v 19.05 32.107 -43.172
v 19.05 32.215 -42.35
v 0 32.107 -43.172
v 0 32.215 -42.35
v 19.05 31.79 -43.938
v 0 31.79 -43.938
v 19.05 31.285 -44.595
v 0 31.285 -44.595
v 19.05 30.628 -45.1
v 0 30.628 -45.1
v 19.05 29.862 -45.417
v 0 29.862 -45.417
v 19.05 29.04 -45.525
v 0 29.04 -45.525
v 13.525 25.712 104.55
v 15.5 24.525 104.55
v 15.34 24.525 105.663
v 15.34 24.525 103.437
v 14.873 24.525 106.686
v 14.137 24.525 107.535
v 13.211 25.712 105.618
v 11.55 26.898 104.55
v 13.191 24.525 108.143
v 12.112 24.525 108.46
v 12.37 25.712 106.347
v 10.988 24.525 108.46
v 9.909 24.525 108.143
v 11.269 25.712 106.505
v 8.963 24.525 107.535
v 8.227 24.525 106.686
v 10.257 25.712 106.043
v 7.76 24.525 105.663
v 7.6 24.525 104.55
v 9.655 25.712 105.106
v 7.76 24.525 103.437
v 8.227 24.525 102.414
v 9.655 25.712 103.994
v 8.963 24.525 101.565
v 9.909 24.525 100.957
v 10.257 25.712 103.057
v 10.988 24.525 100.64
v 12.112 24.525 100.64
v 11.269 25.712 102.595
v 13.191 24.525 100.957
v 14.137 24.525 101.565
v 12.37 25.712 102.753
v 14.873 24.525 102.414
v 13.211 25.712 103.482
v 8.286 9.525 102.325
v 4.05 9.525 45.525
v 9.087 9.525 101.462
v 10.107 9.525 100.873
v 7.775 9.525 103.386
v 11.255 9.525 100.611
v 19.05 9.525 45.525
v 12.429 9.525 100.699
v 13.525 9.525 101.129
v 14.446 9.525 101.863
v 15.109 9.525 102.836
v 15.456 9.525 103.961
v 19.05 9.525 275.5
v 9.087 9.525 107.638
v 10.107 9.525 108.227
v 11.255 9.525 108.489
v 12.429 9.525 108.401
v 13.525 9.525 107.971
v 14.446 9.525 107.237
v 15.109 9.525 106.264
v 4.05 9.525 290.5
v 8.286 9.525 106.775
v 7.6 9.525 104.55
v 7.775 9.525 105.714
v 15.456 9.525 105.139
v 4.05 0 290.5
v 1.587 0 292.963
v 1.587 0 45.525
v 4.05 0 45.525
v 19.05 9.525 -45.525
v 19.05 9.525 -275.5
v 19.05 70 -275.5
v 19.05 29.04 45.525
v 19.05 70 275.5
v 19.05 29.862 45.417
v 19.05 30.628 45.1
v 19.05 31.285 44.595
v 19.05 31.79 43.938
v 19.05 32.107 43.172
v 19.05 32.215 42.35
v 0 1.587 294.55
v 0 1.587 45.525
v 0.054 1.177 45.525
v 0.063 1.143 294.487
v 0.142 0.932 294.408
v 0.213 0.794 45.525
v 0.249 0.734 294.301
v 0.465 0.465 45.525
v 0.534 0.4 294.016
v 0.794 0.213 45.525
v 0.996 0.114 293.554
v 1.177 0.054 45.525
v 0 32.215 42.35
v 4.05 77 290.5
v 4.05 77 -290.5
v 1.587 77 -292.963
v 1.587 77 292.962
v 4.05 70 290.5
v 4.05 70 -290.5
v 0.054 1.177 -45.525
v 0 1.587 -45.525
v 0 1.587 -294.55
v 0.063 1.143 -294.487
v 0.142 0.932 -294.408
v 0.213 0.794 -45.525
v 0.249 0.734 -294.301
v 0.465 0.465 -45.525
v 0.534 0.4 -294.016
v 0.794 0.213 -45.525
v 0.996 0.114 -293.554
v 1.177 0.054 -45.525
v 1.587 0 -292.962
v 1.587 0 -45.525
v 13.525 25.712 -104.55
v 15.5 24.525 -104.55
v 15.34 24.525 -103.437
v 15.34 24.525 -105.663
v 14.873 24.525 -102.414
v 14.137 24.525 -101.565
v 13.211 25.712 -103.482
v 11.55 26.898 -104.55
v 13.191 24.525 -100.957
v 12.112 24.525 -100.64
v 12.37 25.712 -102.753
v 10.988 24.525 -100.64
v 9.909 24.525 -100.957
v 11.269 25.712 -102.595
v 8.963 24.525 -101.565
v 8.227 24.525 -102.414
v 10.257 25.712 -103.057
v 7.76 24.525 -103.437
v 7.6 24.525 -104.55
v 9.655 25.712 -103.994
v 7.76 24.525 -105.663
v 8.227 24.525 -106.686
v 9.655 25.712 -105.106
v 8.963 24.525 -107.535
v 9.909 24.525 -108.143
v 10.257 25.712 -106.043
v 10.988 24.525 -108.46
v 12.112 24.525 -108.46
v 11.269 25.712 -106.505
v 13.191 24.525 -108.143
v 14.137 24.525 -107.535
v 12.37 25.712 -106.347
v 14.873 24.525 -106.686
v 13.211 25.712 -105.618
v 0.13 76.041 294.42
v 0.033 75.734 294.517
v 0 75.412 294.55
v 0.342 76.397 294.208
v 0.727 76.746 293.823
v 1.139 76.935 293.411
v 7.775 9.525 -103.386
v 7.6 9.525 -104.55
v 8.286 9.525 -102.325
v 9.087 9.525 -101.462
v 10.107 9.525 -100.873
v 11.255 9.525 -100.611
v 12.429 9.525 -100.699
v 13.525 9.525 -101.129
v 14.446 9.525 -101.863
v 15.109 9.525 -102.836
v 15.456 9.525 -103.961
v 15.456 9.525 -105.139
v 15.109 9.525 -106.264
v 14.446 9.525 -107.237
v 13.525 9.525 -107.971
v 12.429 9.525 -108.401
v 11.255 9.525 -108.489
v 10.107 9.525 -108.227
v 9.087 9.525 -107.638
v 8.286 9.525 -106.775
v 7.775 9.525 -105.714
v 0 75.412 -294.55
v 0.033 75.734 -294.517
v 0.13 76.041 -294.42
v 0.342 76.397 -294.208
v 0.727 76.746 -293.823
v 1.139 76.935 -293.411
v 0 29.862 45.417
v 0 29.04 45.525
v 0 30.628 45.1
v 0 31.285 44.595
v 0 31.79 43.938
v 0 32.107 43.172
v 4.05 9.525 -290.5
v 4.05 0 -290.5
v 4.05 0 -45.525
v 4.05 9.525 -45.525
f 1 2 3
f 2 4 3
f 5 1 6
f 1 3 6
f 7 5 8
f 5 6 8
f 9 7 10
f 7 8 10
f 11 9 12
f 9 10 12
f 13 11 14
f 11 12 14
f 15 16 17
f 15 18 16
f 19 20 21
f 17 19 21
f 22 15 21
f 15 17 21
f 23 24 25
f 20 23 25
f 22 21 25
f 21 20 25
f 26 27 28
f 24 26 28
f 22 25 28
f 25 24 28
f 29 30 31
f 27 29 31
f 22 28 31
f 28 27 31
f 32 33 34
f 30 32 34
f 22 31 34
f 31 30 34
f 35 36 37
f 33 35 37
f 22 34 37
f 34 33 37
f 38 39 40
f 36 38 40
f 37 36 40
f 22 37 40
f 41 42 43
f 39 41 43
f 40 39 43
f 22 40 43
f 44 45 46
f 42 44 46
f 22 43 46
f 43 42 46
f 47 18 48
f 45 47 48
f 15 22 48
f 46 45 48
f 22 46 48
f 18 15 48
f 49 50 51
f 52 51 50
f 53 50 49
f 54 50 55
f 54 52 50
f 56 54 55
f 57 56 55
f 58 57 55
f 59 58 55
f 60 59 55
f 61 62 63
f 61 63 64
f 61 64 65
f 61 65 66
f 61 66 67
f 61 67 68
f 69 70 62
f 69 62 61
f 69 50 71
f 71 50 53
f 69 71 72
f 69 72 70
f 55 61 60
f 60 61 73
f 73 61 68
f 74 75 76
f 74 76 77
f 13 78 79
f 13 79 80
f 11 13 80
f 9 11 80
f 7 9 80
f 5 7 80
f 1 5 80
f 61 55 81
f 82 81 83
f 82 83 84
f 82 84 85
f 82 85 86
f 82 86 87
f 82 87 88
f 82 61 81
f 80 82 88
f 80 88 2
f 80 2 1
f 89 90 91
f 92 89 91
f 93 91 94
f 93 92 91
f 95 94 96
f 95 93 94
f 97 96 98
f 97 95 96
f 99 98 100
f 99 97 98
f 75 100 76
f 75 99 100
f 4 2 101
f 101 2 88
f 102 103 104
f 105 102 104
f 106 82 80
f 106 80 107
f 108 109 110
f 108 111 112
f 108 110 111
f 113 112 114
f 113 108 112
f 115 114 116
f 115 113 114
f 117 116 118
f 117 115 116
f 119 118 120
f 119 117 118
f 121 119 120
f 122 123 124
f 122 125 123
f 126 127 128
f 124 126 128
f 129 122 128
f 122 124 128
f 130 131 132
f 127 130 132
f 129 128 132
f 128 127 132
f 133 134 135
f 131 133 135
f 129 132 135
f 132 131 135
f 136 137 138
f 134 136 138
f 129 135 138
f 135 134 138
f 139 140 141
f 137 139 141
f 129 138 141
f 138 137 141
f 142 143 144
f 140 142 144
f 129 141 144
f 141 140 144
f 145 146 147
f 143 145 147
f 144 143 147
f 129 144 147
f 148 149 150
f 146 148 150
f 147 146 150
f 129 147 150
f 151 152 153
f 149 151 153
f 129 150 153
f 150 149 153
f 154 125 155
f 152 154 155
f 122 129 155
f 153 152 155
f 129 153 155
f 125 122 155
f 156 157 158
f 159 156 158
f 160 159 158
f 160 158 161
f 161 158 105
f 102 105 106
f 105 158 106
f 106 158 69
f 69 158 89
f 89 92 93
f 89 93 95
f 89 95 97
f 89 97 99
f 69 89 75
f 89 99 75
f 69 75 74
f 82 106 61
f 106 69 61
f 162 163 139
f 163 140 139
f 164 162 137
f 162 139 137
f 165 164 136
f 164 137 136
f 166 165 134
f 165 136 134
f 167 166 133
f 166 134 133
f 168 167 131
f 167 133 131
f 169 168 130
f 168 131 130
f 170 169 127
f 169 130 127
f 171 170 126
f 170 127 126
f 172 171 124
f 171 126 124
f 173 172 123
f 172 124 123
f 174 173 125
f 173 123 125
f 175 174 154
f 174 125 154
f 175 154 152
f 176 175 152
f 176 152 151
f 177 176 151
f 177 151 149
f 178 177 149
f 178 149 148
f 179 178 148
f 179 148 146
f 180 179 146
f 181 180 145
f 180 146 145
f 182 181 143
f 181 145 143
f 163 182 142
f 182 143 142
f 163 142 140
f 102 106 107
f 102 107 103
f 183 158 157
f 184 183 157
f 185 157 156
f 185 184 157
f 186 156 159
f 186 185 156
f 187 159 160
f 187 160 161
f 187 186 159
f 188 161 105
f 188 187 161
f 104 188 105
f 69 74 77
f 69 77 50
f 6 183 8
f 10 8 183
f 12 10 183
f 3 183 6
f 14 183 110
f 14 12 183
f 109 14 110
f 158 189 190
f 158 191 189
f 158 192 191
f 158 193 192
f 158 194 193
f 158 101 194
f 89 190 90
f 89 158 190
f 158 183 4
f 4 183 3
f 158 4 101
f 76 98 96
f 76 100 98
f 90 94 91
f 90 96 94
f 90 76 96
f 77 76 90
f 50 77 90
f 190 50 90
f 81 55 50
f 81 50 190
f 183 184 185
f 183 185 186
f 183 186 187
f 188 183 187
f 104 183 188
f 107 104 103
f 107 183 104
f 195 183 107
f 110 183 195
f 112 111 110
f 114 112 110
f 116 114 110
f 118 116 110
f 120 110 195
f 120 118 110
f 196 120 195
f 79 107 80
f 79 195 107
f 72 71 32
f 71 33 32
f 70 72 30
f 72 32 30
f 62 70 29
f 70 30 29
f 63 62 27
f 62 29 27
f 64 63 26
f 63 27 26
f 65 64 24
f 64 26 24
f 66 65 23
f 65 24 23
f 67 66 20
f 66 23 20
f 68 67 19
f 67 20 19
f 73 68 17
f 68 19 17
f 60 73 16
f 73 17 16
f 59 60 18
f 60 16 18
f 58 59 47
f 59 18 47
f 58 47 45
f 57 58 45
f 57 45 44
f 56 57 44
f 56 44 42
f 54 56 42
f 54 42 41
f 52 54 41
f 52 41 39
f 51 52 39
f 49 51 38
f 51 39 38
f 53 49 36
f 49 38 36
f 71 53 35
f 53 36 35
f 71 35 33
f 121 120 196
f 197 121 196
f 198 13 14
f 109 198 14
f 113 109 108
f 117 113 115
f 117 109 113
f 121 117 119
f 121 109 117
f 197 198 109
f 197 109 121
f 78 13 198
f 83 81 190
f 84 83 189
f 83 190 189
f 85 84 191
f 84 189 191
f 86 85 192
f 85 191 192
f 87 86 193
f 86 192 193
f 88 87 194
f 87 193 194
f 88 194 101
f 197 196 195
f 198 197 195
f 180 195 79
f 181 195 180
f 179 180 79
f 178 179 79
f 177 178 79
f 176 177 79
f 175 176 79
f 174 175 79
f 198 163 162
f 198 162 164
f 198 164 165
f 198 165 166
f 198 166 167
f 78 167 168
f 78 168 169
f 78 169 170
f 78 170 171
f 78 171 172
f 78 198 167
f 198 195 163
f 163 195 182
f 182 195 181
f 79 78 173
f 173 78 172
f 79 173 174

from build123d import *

# Parameters (mm, degrees)
BOSS_EXTRUDE1_DEPTH            = 294.55
FILLET1_R                      = 1.5875
CUT_EXTRUDE1_DEPTH             = 306.043611636
CUT_EXTRUDE1_DEPTH_BACK        = 306.043611636
F_7_9_7_9_DIAMETER_HOLE2_D     = 7.9
F_7_9_7_9_DIAMETER_HOLE2_DEPTH = 15
F_7_9_7_9_DIAMETER_HOLE2_TIP   = 2.373399445
CUT_EXTRUDE3_DEPTH             = 306.043611636
CUT_EXTRUDE3_DEPTH_BACK        = 306.043611636
SKETCH9_W                      = 91.05
SKETCH9_H                      = 25
SKETCH9_H_2                    = 5.6275
SKETCH9_H_3                    = 1.5875
FILLET2_R                      = 3.175


with BuildPart() as part:
    # Sketch1 → Boss-Extrude1 (new, symmetric)
    with BuildSketch(Plane.XY):
        Polygon((0, 77), (0, 0), (4.05, 0), (4.05, 9.525), (19.05, 9.525), (19.05, 70), (4.05, 70), (4.05, 77), align=None)
    extrude(amount=BOSS_EXTRUDE1_DEPTH, both=True)

    # Fillet1
    fillet1_edges = [part.edges().sort_by_distance(p)[0] for p in [
        (0, 0, 0),
        (0, 77, 0),
    ]]
    fillet(fillet1_edges, radius=FILLET1_R)

    # Sketch2 → Cut-Extrude1 (cut, two sides: drawn at the far end of the back side and taken through both)
    with BuildSketch(Plane(origin=(0, 77, 0), x_dir=(1, 0, 0), z_dir=(0, 1, 0)).offset(-CUT_EXTRUDE1_DEPTH_BACK)):
        Polygon((0, 294.55), (19.05, 275.5), (19.05, 294.55), align=None)
        Polygon((19.05, -275.5), (19.05, -294.55), (0, -294.55), align=None)
    extrude(amount=CUT_EXTRUDE1_DEPTH + CUT_EXTRUDE1_DEPTH_BACK, mode=Mode.SUBTRACT)

    # Ø7.9 (7.9) Diameter Hole2
    with Locations(Plane.XZ.offset(-9.525)):
        with Locations((11.55, -104.55), (11.55, 104.55)):
            Hole(F_7_9_7_9_DIAMETER_HOLE2_D / 2, depth=F_7_9_7_9_DIAMETER_HOLE2_DEPTH)
            with Locations((0, 0, -(F_7_9_7_9_DIAMETER_HOLE2_DEPTH + F_7_9_7_9_DIAMETER_HOLE2_TIP / 2))):  # 118° drill point
                Cone(0, F_7_9_7_9_DIAMETER_HOLE2_D / 2, F_7_9_7_9_DIAMETER_HOLE2_TIP, mode=Mode.SUBTRACT)

    # Sketch9 → Cut-Extrude3 (cut, two sides: drawn at the far end of the back side and taken through both)
    with BuildSketch(Plane.ZY.offset(-CUT_EXTRUDE3_DEPTH_BACK)):
        with Locations((0, 19.715)):
            Rectangle(SKETCH9_W, SKETCH9_H)
        with Locations((0, 4.40125)):
            Rectangle(SKETCH9_W, SKETCH9_H_2)
        with Locations((0, 0.79375)):
            Rectangle(SKETCH9_W, SKETCH9_H_3)
    extrude(amount=CUT_EXTRUDE3_DEPTH + CUT_EXTRUDE3_DEPTH_BACK, mode=Mode.SUBTRACT)

    # Fillet2
    fillet2_edges = [part.edges().sort_by_distance(p)[0] for p in [
        (9.525, 32.215, 45.525),
        (9.525, 32.215, -45.525),
    ]]
    fillet(fillet2_edges, radius=FILLET2_R)


solid = part.part
